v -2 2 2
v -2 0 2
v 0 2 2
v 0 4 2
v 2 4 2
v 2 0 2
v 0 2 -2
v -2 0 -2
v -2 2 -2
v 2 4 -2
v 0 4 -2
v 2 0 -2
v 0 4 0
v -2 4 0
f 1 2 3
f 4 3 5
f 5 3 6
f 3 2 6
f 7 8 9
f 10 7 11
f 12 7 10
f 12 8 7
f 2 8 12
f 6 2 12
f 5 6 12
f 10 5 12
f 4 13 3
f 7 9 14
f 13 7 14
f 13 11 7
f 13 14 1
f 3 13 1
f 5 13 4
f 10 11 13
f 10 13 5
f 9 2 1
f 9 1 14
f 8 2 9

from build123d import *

# Parameters (mm, degrees)
SKETCH1_W           = 4
SKETCH1_H           = 4
BOSS_EXTRUDE1_DEPTH = 4
CUT_EXTRUDE1_DEPTH  = 2


with BuildPart() as part:
    # Sketch1 → Boss-Extrude1 (new body)
    with BuildSketch(Plane(origin=(0, 0, 0), x_dir=(1, 0, 0), z_dir=(0, 1, 0))):
        Rectangle(SKETCH1_W, SKETCH1_H)
    extrude(amount=BOSS_EXTRUDE1_DEPTH)

    # Sketch2 → Cut-Extrude1 (cut)
    with BuildSketch(Plane.ZY.offset(2)):
        Polygon((-2, 2), (0, 4), (-2, 4), align=None)
        Polygon((0, 4), (2, 2), (2, 4), align=None)
    extrude(amount=-CUT_EXTRUDE1_DEPTH, mode=Mode.SUBTRACT)


solid = part.part
